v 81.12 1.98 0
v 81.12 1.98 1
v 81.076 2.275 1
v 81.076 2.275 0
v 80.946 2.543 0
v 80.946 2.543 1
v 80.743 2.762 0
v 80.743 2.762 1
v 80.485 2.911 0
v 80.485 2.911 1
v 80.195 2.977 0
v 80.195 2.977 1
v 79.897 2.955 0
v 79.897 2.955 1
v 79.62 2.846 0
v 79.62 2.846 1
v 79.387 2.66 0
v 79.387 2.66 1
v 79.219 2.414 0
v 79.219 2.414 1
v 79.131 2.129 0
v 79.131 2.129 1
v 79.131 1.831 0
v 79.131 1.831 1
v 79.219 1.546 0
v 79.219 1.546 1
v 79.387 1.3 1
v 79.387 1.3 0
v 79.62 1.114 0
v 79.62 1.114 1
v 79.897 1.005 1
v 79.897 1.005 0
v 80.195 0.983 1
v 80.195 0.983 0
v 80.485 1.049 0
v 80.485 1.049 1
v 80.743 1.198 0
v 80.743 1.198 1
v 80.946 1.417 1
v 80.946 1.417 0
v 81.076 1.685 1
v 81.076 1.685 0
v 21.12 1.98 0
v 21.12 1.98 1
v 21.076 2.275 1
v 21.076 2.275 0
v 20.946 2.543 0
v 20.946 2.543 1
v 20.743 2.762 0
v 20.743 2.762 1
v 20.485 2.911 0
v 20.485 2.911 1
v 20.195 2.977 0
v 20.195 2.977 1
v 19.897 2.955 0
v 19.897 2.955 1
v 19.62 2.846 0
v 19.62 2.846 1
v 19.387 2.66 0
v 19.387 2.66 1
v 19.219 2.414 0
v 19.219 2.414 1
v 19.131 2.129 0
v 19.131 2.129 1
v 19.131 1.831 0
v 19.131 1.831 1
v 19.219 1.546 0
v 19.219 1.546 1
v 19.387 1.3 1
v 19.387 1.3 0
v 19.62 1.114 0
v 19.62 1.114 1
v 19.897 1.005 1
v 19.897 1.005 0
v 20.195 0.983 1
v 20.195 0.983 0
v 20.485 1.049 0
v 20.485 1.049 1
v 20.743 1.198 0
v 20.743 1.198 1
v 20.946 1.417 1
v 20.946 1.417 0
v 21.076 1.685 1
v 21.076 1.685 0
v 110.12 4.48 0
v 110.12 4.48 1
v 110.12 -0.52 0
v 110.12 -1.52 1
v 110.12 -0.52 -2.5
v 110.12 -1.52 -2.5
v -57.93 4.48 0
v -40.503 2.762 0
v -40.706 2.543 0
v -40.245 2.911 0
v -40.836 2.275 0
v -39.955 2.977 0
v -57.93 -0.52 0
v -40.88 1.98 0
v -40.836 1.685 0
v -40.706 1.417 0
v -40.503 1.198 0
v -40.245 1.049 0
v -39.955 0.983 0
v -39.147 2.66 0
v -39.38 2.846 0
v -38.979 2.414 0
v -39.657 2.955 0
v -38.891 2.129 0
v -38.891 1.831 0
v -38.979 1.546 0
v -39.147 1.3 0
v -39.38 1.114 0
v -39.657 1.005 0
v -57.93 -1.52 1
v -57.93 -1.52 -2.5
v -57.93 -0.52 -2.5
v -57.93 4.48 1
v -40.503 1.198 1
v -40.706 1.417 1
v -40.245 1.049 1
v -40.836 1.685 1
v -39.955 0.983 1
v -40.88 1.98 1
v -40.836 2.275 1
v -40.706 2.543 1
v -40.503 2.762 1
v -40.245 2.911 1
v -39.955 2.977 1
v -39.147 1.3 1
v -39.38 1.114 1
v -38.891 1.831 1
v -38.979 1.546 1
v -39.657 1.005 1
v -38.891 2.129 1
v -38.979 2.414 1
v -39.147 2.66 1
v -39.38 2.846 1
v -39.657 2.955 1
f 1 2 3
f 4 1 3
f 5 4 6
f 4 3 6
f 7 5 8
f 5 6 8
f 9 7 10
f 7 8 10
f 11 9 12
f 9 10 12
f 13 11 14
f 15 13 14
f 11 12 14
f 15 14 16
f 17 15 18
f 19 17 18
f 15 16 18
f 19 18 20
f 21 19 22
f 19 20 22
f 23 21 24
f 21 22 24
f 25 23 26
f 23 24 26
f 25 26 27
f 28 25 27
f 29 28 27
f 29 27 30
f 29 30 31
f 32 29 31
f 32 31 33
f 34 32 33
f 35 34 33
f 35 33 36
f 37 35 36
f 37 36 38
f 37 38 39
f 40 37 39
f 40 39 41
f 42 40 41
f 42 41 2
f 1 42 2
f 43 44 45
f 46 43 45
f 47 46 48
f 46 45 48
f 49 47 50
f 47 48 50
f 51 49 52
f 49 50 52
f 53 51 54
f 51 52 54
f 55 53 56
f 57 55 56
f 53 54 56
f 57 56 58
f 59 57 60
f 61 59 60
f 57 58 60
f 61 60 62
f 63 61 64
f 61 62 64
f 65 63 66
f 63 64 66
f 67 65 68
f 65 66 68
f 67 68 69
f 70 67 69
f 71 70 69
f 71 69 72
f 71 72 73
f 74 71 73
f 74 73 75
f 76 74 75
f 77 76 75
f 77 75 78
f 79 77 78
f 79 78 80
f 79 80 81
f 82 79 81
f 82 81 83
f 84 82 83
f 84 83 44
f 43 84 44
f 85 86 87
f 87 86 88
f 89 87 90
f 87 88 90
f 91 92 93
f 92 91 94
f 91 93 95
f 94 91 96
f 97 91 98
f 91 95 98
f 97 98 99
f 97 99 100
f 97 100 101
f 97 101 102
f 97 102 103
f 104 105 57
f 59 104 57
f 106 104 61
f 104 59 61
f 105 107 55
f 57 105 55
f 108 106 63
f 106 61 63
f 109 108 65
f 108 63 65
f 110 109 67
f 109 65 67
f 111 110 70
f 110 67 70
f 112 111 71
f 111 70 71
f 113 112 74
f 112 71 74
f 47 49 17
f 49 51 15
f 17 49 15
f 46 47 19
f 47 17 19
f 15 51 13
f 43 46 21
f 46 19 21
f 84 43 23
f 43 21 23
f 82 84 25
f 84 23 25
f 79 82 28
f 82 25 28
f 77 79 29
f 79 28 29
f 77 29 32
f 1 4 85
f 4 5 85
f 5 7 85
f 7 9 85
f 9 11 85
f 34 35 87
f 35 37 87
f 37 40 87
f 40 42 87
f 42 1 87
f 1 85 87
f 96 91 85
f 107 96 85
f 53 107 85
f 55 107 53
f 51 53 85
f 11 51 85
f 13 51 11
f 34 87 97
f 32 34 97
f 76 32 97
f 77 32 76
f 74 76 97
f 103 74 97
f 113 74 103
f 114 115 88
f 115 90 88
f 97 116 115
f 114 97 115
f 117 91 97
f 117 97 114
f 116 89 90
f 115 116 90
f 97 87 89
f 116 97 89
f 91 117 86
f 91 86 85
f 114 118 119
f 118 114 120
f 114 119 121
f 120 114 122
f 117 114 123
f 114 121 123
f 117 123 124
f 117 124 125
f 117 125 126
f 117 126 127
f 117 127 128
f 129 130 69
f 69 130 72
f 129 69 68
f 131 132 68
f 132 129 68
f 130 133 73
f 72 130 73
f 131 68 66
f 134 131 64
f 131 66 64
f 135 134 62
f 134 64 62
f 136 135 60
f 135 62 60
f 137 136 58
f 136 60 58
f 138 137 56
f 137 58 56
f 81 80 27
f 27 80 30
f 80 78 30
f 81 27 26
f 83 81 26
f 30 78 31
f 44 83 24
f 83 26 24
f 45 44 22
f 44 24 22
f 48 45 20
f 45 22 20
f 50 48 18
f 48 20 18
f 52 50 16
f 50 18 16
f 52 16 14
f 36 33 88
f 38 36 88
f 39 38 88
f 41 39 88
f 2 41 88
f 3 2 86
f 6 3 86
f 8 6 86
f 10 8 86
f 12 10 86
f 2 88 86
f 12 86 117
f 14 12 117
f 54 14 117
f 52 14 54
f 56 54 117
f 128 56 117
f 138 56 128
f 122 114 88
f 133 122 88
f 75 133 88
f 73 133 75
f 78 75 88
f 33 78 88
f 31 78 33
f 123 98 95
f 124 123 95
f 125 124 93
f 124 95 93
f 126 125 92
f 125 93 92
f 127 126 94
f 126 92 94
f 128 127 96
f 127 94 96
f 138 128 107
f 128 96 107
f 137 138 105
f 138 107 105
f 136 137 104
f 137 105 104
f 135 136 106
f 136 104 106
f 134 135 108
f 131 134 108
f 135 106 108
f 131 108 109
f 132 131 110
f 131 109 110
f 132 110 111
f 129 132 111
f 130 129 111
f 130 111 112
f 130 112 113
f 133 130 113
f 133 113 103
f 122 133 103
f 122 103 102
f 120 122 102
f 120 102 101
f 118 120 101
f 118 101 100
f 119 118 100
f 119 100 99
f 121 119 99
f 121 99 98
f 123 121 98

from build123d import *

# Parameters (mm, degrees)
SKETCH1_W           = 64.72
SKETCH1_H           = 10
BOSS_EXTRUDE1_DEPTH = 1
SKETCH2_W           = 64.72
SKETCH2_H           = 1
BOSS_EXTRUDE2_DEPTH = 5
BOSS_EXTRUDE3_DEPTH = 60
SKETCH4_W           = 1
SKETCH4_H           = 5
CUT_EXTRUDE1_DEPTH  = 125.72
SKETCH5_W           = 4.72
SKETCH5_H           = 6
CUT_EXTRUDE2_DEPTH  = 6
SKETCH6_W           = 120
SKETCH6_H           = 1
BOSS_EXTRUDE4_DEPTH = 1
SKETCH7_R           = 1
CUT_EXTRUDE3_DEPTH  = 7
SKETCH8_W           = 120
SKETCH8_H           = 2.5
CUT_EXTRUDE4_DEPTH  = 2
BOSS_EXTRUDE5_DEPTH = 48.05
SKETCH13_R          = 1
CUT_EXTRUDE5_DEPTH  = 2


with BuildPart() as part:
    # Sketch1 → Boss-Extrude1 (new body)
    with BuildSketch(Plane.XY):
        with Locations((17.76, 3.48)):
            Rectangle(SKETCH1_W, SKETCH1_H)
    extrude(amount=BOSS_EXTRUDE1_DEPTH)

    # Sketch2 → Boss-Extrude2 (add)
    with BuildSketch(Plane(origin=(0, 0, 0), x_dir=(-1, 0, 0), z_dir=(0, 0, -1))):
        with Locations((-17.76, -1.02)):
            Rectangle(SKETCH2_W, SKETCH2_H)
    extrude(amount=BOSS_EXTRUDE2_DEPTH)

    # Sketch3 → Boss-Extrude3 (add)
    with BuildSketch(Plane(origin=(50.12, 0, 0), x_dir=(0, 0, -1), z_dir=(1, 0, 0))):
        Polygon((-1, 8.48), (0, 8.48), (0, -0.52), (5, -0.52), (5, -1.52), (-1, -1.52), align=None)
    extrude(amount=BOSS_EXTRUDE3_DEPTH)

    # Sketch4 → Cut-Extrude1 (cut, through all)
    with BuildSketch(Plane(origin=(110.12, 0, 0), x_dir=(0, 0, -1), z_dir=(1, 0, 0))):
        with Locations((-0.5, 5.98)):
            Rectangle(SKETCH4_W, SKETCH4_H)
    extrude(amount=-CUT_EXTRUDE1_DEPTH, mode=Mode.SUBTRACT)

    # Sketch5 → Cut-Extrude2 (cut, through all)
    with BuildSketch(Plane(origin=(0, 3.48, 0), x_dir=(1, 0, 0), z_dir=(0, 1, 0))):
        with Locations((-12.24, 2)):
            Rectangle(SKETCH5_W, SKETCH5_H)
    extrude(amount=-CUT_EXTRUDE2_DEPTH, mode=Mode.SUBTRACT)

    # Sketch6 → Boss-Extrude4 (add)
    with BuildSketch(Plane(origin=(0, 3.48, 0), x_dir=(1, 0, 0), z_dir=(0, 1, 0))):
        with Locations((50.12, -0.5)):
            Rectangle(SKETCH6_W, SKETCH6_H)
    extrude(amount=BOSS_EXTRUDE4_DEPTH)

    # Sketch7 → Cut-Extrude3 (cut, through all)
    with BuildSketch(Plane.XY.offset(1)):
        with Locations((20.12, 1.98)):
            Circle(SKETCH7_R)
        with Locations((80.12, 1.98)):
            Circle(SKETCH7_R)
    extrude(amount=-CUT_EXTRUDE3_DEPTH, mode=Mode.SUBTRACT)

    # Sketch8 → Cut-Extrude4 (cut, through all)
    with BuildSketch(Plane(origin=(0, -0.52, 0), x_dir=(1, 0, 0), z_dir=(0, 1, 0))):
        with Locations((50.12, 3.75)):
            Rectangle(SKETCH8_W, SKETCH8_H)
    extrude(amount=-CUT_EXTRUDE4_DEPTH, mode=Mode.SUBTRACT)

    # Sketch11 → Boss-Extrude5 (add)
    with BuildSketch(Plane.ZY.offset(9.88)):
        Polygon((-2.5, -0.52), (-2.5, -1.52), (1, -1.52), (1, 4.48), (0, 4.48), (0, -0.52), align=None)
    extrude(amount=BOSS_EXTRUDE5_DEPTH)

    # Sketch13 → Cut-Extrude5 (cut, through all)
    with BuildSketch(Plane(origin=(0, 0, 0), x_dir=(-1, 0, 0), z_dir=(0, 0, -1))):
        with Locations((39.88, 1.98)):
            Circle(SKETCH13_R)
    extrude(amount=-CUT_EXTRUDE5_DEPTH, mode=Mode.SUBTRACT)


solid = part.part
